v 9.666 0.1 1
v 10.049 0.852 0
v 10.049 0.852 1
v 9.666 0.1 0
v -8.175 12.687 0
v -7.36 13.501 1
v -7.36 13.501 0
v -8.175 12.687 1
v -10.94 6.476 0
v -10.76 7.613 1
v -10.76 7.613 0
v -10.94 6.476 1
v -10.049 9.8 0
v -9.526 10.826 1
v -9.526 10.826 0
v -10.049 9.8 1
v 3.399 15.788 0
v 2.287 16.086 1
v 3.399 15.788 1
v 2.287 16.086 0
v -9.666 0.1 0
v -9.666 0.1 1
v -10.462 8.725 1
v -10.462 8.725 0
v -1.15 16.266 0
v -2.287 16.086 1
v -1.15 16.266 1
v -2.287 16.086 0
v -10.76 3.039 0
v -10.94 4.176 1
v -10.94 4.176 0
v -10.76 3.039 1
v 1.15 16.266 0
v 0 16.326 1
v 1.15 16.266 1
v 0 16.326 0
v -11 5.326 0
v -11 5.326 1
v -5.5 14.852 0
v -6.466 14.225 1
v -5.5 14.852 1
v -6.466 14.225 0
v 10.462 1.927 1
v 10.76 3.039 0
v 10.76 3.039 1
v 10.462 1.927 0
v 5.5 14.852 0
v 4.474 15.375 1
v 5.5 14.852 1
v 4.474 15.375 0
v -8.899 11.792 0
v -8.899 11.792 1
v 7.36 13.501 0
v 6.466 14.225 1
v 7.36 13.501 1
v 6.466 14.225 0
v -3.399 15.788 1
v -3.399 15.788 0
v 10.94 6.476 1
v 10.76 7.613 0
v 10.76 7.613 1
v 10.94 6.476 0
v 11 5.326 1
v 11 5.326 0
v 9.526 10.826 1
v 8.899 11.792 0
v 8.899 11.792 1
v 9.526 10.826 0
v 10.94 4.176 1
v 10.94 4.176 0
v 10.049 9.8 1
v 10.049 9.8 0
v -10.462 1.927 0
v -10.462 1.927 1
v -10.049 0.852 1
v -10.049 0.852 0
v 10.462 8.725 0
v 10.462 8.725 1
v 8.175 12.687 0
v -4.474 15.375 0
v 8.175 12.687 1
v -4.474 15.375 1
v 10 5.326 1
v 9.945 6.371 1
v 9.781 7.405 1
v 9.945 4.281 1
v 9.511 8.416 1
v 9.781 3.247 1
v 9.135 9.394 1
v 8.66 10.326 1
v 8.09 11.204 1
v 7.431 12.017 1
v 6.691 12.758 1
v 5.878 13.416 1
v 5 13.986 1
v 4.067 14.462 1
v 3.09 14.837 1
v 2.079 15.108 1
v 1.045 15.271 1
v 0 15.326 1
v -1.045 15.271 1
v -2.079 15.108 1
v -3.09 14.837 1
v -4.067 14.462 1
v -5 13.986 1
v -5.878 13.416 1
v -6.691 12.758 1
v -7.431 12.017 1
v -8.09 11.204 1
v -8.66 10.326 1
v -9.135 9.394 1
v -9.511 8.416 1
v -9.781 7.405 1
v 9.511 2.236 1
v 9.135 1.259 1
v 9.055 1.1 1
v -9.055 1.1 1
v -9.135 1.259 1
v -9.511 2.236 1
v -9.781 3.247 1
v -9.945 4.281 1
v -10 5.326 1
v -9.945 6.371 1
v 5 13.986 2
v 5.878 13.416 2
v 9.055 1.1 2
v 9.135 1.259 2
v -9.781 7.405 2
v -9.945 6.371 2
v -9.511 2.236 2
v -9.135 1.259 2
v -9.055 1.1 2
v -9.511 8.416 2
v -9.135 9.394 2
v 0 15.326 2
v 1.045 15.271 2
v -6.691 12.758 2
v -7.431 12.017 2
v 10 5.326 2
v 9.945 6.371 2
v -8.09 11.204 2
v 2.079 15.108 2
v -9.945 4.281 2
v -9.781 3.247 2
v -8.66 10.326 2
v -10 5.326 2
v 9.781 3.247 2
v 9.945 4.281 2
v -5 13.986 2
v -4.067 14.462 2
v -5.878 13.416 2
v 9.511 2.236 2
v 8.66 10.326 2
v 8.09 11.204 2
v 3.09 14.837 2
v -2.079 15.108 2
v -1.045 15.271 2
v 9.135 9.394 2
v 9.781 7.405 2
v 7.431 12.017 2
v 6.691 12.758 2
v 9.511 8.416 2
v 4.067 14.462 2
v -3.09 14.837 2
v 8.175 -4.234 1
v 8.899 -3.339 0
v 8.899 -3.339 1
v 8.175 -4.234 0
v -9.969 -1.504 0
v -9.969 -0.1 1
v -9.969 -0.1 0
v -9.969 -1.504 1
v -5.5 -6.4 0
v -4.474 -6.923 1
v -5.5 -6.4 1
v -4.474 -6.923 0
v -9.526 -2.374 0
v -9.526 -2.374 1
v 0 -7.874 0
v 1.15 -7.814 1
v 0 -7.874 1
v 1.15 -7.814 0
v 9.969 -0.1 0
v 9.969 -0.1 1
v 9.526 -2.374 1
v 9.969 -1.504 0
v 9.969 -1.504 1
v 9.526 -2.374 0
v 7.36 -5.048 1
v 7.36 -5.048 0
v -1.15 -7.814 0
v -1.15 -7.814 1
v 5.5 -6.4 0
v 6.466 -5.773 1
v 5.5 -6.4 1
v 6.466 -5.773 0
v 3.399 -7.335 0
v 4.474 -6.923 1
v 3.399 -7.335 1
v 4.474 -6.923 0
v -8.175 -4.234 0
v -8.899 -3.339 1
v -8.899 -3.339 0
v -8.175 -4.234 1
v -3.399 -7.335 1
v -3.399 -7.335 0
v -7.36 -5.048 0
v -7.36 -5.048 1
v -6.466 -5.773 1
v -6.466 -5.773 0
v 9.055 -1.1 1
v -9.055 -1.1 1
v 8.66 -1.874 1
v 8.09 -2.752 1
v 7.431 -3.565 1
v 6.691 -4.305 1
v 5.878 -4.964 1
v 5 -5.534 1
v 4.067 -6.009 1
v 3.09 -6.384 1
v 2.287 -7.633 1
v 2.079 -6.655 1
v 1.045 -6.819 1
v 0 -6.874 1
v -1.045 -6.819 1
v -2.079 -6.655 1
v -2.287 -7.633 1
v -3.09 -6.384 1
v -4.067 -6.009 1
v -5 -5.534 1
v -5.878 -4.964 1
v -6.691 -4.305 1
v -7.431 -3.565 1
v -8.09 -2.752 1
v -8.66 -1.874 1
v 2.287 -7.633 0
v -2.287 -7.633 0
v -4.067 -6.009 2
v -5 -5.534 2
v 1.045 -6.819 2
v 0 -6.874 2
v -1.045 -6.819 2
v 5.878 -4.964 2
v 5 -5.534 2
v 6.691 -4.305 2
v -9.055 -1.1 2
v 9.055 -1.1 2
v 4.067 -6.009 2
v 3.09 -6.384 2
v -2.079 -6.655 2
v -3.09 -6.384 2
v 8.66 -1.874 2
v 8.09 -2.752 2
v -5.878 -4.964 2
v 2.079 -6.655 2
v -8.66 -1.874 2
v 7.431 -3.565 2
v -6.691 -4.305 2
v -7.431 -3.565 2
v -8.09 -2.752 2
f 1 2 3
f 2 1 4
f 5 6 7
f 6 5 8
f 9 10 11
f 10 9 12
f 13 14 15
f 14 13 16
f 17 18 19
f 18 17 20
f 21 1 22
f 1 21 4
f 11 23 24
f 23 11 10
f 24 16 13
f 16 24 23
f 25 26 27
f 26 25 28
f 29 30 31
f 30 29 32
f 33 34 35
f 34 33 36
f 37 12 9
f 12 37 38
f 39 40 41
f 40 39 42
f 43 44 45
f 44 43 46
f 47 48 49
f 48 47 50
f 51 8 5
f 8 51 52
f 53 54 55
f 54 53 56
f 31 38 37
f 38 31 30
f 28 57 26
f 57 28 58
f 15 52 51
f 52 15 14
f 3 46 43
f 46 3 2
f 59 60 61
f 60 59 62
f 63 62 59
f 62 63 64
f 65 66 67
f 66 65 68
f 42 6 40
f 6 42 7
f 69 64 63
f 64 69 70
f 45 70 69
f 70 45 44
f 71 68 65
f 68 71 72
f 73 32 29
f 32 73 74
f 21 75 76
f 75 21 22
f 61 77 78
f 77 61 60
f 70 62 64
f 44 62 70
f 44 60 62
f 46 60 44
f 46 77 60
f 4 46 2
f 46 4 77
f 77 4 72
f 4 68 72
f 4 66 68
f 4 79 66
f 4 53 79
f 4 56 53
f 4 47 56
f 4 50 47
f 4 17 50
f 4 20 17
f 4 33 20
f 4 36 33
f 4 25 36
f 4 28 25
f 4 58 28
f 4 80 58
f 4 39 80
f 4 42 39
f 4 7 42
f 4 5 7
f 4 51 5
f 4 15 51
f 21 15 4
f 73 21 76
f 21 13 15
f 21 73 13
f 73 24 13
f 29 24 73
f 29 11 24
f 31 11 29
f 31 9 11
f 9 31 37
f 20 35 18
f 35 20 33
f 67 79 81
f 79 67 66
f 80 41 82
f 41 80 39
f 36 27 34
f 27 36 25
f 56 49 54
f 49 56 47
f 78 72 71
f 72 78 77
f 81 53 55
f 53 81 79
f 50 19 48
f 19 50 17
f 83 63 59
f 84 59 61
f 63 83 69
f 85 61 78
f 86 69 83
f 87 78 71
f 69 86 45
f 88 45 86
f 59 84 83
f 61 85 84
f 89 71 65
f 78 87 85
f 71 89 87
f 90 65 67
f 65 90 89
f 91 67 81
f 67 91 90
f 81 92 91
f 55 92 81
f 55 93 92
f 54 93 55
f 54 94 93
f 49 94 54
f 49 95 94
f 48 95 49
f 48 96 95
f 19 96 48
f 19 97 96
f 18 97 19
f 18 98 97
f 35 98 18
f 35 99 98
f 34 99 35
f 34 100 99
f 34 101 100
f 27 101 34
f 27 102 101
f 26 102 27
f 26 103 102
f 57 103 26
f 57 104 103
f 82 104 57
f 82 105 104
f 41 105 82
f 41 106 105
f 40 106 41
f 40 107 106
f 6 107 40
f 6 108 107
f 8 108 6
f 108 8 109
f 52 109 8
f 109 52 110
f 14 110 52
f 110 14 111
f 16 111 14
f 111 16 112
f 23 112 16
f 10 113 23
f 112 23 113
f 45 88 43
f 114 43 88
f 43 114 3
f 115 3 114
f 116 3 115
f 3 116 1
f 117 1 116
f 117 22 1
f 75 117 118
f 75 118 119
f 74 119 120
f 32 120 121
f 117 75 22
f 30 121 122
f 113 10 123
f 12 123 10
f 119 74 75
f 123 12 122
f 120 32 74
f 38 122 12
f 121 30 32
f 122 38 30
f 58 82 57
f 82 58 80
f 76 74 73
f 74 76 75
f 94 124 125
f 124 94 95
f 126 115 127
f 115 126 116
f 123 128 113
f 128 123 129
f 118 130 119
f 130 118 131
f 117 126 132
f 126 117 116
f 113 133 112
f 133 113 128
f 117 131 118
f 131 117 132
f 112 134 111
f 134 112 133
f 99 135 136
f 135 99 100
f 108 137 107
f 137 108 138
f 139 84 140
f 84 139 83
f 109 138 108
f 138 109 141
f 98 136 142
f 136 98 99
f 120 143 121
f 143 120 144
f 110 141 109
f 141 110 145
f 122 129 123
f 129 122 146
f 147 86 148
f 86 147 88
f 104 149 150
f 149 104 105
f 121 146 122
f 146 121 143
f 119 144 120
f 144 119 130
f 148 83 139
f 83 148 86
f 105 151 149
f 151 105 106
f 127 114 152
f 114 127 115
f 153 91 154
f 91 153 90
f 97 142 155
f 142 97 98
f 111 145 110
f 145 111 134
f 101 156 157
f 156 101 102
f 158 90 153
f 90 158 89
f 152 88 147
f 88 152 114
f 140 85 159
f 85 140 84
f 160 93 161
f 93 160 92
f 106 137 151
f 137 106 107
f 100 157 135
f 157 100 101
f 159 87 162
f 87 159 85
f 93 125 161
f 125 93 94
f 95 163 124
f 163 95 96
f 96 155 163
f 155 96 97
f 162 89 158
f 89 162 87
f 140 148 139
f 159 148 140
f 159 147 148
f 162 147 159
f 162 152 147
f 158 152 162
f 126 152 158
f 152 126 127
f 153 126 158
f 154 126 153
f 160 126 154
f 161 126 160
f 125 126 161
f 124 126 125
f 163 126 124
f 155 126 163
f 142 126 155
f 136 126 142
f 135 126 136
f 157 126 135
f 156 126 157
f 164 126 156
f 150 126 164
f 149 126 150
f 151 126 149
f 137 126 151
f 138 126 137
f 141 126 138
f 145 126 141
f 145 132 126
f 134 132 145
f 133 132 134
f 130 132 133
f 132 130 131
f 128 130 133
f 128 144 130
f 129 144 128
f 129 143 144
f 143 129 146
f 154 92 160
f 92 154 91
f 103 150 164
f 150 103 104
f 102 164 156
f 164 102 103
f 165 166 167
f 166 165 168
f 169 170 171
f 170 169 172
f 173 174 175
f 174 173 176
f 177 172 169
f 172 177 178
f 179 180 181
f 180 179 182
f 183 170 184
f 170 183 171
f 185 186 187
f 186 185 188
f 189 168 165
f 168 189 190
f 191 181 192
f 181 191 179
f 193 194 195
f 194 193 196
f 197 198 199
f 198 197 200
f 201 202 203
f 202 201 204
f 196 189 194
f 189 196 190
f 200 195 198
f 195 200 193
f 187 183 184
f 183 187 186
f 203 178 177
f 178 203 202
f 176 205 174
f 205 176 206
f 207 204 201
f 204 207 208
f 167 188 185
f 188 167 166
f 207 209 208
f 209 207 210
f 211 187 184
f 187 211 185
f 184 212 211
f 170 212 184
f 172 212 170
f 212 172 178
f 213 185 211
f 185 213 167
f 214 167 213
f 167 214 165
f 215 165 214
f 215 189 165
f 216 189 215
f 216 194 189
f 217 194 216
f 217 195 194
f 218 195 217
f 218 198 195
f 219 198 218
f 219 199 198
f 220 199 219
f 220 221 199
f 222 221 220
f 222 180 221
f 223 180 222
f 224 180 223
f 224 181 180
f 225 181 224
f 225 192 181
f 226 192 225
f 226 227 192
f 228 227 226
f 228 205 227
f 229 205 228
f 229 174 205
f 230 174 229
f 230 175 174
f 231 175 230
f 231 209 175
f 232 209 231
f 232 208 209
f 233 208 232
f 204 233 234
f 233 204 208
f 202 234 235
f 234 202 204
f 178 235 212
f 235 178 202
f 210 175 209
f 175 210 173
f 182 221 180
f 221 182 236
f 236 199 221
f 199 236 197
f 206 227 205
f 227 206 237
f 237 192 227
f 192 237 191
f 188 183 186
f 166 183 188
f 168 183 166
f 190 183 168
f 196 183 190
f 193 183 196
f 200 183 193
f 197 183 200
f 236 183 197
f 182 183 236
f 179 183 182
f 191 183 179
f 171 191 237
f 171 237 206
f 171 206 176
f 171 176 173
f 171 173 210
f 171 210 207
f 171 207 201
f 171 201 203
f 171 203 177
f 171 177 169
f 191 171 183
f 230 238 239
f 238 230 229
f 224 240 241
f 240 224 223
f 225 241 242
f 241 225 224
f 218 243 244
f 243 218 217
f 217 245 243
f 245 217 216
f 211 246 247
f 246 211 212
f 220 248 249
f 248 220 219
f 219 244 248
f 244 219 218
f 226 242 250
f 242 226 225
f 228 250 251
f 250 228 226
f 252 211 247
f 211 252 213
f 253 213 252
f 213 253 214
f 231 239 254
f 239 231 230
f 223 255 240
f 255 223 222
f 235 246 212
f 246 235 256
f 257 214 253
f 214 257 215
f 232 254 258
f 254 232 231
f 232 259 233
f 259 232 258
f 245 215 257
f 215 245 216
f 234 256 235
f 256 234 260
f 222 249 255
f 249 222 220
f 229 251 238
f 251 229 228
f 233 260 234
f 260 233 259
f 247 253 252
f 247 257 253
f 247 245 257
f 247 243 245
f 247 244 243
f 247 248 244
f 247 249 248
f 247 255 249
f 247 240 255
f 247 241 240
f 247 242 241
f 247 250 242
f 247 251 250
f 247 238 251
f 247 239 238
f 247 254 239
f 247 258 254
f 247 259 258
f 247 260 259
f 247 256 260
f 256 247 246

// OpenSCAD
// Unit of length: Unit.MM
$fn = 60;
$vpr = [0.0, 0.0, 0.0];

union()
{
   translate(v = [0.0, 1.1])
   {
      union()
      {
         color(c = [1.0, 0.0, 0.0, 1.0])
         {
            linear_extrude(height = 1.0, center = false, twist = 0.0, scale = 1.0)
            {
               translate(v = [0.0, 4.2262])
               {
                  intersection()
                  {
                     circle(d = 22.0);
                     polygon(points = [[-11.0, -5.2262], [-11.0, 11.0], [11.0, 11.0], [11.0, -5.2262]]);
                  }
               }
            }
         }
         translate(v = [0.0, 0.0, 0.0])
         {
            linear_extrude(height = 2.0, center = false, twist = 0.0, scale = 1.0)
            {
               translate(v = [0.0, 4.2262])
               {
                  intersection()
                  {
                     circle(d = 20.0);
                     polygon(points = [[-10.0, -4.2262], [-10.0, 10.0], [10.0, 10.0], [10.0, -4.2262]]);
                  }
               }
            }
         }
      }
   }
   translate(v = [0.0, -1.1])
   {
      union()
      {
         color(c = [1.0, 0.0, 0.0, 1.0])
         {
            linear_extrude(height = 1.0, center = false, twist = 0.0, scale = 1.0)
            {
               translate(v = [0.0, 4.2262])
               {
                  intersection()
                  {
                     circle(d = 22.0);
                     polygon(points = [[-9.9694, -11.0], [-9.9694, -3.2262], [9.9694, -3.2262], [9.9694, -11.0]]);
                  }
               }
            }
         }
         translate(v = [0.0, 0.0, 0.0])
         {
            linear_extrude(height = 2.0, center = false, twist = 0.0, scale = 1.0)
            {
               translate(v = [0.0, 4.2262])
               {
                  intersection()
                  {
                     circle(d = 20.0);
                     polygon(points = [[-9.0631, -10.0], [-9.0631, -4.2262], [9.0631, -4.2262], [9.0631, -10.0]]);
                  }
               }
            }
         }
      }
   }
}
